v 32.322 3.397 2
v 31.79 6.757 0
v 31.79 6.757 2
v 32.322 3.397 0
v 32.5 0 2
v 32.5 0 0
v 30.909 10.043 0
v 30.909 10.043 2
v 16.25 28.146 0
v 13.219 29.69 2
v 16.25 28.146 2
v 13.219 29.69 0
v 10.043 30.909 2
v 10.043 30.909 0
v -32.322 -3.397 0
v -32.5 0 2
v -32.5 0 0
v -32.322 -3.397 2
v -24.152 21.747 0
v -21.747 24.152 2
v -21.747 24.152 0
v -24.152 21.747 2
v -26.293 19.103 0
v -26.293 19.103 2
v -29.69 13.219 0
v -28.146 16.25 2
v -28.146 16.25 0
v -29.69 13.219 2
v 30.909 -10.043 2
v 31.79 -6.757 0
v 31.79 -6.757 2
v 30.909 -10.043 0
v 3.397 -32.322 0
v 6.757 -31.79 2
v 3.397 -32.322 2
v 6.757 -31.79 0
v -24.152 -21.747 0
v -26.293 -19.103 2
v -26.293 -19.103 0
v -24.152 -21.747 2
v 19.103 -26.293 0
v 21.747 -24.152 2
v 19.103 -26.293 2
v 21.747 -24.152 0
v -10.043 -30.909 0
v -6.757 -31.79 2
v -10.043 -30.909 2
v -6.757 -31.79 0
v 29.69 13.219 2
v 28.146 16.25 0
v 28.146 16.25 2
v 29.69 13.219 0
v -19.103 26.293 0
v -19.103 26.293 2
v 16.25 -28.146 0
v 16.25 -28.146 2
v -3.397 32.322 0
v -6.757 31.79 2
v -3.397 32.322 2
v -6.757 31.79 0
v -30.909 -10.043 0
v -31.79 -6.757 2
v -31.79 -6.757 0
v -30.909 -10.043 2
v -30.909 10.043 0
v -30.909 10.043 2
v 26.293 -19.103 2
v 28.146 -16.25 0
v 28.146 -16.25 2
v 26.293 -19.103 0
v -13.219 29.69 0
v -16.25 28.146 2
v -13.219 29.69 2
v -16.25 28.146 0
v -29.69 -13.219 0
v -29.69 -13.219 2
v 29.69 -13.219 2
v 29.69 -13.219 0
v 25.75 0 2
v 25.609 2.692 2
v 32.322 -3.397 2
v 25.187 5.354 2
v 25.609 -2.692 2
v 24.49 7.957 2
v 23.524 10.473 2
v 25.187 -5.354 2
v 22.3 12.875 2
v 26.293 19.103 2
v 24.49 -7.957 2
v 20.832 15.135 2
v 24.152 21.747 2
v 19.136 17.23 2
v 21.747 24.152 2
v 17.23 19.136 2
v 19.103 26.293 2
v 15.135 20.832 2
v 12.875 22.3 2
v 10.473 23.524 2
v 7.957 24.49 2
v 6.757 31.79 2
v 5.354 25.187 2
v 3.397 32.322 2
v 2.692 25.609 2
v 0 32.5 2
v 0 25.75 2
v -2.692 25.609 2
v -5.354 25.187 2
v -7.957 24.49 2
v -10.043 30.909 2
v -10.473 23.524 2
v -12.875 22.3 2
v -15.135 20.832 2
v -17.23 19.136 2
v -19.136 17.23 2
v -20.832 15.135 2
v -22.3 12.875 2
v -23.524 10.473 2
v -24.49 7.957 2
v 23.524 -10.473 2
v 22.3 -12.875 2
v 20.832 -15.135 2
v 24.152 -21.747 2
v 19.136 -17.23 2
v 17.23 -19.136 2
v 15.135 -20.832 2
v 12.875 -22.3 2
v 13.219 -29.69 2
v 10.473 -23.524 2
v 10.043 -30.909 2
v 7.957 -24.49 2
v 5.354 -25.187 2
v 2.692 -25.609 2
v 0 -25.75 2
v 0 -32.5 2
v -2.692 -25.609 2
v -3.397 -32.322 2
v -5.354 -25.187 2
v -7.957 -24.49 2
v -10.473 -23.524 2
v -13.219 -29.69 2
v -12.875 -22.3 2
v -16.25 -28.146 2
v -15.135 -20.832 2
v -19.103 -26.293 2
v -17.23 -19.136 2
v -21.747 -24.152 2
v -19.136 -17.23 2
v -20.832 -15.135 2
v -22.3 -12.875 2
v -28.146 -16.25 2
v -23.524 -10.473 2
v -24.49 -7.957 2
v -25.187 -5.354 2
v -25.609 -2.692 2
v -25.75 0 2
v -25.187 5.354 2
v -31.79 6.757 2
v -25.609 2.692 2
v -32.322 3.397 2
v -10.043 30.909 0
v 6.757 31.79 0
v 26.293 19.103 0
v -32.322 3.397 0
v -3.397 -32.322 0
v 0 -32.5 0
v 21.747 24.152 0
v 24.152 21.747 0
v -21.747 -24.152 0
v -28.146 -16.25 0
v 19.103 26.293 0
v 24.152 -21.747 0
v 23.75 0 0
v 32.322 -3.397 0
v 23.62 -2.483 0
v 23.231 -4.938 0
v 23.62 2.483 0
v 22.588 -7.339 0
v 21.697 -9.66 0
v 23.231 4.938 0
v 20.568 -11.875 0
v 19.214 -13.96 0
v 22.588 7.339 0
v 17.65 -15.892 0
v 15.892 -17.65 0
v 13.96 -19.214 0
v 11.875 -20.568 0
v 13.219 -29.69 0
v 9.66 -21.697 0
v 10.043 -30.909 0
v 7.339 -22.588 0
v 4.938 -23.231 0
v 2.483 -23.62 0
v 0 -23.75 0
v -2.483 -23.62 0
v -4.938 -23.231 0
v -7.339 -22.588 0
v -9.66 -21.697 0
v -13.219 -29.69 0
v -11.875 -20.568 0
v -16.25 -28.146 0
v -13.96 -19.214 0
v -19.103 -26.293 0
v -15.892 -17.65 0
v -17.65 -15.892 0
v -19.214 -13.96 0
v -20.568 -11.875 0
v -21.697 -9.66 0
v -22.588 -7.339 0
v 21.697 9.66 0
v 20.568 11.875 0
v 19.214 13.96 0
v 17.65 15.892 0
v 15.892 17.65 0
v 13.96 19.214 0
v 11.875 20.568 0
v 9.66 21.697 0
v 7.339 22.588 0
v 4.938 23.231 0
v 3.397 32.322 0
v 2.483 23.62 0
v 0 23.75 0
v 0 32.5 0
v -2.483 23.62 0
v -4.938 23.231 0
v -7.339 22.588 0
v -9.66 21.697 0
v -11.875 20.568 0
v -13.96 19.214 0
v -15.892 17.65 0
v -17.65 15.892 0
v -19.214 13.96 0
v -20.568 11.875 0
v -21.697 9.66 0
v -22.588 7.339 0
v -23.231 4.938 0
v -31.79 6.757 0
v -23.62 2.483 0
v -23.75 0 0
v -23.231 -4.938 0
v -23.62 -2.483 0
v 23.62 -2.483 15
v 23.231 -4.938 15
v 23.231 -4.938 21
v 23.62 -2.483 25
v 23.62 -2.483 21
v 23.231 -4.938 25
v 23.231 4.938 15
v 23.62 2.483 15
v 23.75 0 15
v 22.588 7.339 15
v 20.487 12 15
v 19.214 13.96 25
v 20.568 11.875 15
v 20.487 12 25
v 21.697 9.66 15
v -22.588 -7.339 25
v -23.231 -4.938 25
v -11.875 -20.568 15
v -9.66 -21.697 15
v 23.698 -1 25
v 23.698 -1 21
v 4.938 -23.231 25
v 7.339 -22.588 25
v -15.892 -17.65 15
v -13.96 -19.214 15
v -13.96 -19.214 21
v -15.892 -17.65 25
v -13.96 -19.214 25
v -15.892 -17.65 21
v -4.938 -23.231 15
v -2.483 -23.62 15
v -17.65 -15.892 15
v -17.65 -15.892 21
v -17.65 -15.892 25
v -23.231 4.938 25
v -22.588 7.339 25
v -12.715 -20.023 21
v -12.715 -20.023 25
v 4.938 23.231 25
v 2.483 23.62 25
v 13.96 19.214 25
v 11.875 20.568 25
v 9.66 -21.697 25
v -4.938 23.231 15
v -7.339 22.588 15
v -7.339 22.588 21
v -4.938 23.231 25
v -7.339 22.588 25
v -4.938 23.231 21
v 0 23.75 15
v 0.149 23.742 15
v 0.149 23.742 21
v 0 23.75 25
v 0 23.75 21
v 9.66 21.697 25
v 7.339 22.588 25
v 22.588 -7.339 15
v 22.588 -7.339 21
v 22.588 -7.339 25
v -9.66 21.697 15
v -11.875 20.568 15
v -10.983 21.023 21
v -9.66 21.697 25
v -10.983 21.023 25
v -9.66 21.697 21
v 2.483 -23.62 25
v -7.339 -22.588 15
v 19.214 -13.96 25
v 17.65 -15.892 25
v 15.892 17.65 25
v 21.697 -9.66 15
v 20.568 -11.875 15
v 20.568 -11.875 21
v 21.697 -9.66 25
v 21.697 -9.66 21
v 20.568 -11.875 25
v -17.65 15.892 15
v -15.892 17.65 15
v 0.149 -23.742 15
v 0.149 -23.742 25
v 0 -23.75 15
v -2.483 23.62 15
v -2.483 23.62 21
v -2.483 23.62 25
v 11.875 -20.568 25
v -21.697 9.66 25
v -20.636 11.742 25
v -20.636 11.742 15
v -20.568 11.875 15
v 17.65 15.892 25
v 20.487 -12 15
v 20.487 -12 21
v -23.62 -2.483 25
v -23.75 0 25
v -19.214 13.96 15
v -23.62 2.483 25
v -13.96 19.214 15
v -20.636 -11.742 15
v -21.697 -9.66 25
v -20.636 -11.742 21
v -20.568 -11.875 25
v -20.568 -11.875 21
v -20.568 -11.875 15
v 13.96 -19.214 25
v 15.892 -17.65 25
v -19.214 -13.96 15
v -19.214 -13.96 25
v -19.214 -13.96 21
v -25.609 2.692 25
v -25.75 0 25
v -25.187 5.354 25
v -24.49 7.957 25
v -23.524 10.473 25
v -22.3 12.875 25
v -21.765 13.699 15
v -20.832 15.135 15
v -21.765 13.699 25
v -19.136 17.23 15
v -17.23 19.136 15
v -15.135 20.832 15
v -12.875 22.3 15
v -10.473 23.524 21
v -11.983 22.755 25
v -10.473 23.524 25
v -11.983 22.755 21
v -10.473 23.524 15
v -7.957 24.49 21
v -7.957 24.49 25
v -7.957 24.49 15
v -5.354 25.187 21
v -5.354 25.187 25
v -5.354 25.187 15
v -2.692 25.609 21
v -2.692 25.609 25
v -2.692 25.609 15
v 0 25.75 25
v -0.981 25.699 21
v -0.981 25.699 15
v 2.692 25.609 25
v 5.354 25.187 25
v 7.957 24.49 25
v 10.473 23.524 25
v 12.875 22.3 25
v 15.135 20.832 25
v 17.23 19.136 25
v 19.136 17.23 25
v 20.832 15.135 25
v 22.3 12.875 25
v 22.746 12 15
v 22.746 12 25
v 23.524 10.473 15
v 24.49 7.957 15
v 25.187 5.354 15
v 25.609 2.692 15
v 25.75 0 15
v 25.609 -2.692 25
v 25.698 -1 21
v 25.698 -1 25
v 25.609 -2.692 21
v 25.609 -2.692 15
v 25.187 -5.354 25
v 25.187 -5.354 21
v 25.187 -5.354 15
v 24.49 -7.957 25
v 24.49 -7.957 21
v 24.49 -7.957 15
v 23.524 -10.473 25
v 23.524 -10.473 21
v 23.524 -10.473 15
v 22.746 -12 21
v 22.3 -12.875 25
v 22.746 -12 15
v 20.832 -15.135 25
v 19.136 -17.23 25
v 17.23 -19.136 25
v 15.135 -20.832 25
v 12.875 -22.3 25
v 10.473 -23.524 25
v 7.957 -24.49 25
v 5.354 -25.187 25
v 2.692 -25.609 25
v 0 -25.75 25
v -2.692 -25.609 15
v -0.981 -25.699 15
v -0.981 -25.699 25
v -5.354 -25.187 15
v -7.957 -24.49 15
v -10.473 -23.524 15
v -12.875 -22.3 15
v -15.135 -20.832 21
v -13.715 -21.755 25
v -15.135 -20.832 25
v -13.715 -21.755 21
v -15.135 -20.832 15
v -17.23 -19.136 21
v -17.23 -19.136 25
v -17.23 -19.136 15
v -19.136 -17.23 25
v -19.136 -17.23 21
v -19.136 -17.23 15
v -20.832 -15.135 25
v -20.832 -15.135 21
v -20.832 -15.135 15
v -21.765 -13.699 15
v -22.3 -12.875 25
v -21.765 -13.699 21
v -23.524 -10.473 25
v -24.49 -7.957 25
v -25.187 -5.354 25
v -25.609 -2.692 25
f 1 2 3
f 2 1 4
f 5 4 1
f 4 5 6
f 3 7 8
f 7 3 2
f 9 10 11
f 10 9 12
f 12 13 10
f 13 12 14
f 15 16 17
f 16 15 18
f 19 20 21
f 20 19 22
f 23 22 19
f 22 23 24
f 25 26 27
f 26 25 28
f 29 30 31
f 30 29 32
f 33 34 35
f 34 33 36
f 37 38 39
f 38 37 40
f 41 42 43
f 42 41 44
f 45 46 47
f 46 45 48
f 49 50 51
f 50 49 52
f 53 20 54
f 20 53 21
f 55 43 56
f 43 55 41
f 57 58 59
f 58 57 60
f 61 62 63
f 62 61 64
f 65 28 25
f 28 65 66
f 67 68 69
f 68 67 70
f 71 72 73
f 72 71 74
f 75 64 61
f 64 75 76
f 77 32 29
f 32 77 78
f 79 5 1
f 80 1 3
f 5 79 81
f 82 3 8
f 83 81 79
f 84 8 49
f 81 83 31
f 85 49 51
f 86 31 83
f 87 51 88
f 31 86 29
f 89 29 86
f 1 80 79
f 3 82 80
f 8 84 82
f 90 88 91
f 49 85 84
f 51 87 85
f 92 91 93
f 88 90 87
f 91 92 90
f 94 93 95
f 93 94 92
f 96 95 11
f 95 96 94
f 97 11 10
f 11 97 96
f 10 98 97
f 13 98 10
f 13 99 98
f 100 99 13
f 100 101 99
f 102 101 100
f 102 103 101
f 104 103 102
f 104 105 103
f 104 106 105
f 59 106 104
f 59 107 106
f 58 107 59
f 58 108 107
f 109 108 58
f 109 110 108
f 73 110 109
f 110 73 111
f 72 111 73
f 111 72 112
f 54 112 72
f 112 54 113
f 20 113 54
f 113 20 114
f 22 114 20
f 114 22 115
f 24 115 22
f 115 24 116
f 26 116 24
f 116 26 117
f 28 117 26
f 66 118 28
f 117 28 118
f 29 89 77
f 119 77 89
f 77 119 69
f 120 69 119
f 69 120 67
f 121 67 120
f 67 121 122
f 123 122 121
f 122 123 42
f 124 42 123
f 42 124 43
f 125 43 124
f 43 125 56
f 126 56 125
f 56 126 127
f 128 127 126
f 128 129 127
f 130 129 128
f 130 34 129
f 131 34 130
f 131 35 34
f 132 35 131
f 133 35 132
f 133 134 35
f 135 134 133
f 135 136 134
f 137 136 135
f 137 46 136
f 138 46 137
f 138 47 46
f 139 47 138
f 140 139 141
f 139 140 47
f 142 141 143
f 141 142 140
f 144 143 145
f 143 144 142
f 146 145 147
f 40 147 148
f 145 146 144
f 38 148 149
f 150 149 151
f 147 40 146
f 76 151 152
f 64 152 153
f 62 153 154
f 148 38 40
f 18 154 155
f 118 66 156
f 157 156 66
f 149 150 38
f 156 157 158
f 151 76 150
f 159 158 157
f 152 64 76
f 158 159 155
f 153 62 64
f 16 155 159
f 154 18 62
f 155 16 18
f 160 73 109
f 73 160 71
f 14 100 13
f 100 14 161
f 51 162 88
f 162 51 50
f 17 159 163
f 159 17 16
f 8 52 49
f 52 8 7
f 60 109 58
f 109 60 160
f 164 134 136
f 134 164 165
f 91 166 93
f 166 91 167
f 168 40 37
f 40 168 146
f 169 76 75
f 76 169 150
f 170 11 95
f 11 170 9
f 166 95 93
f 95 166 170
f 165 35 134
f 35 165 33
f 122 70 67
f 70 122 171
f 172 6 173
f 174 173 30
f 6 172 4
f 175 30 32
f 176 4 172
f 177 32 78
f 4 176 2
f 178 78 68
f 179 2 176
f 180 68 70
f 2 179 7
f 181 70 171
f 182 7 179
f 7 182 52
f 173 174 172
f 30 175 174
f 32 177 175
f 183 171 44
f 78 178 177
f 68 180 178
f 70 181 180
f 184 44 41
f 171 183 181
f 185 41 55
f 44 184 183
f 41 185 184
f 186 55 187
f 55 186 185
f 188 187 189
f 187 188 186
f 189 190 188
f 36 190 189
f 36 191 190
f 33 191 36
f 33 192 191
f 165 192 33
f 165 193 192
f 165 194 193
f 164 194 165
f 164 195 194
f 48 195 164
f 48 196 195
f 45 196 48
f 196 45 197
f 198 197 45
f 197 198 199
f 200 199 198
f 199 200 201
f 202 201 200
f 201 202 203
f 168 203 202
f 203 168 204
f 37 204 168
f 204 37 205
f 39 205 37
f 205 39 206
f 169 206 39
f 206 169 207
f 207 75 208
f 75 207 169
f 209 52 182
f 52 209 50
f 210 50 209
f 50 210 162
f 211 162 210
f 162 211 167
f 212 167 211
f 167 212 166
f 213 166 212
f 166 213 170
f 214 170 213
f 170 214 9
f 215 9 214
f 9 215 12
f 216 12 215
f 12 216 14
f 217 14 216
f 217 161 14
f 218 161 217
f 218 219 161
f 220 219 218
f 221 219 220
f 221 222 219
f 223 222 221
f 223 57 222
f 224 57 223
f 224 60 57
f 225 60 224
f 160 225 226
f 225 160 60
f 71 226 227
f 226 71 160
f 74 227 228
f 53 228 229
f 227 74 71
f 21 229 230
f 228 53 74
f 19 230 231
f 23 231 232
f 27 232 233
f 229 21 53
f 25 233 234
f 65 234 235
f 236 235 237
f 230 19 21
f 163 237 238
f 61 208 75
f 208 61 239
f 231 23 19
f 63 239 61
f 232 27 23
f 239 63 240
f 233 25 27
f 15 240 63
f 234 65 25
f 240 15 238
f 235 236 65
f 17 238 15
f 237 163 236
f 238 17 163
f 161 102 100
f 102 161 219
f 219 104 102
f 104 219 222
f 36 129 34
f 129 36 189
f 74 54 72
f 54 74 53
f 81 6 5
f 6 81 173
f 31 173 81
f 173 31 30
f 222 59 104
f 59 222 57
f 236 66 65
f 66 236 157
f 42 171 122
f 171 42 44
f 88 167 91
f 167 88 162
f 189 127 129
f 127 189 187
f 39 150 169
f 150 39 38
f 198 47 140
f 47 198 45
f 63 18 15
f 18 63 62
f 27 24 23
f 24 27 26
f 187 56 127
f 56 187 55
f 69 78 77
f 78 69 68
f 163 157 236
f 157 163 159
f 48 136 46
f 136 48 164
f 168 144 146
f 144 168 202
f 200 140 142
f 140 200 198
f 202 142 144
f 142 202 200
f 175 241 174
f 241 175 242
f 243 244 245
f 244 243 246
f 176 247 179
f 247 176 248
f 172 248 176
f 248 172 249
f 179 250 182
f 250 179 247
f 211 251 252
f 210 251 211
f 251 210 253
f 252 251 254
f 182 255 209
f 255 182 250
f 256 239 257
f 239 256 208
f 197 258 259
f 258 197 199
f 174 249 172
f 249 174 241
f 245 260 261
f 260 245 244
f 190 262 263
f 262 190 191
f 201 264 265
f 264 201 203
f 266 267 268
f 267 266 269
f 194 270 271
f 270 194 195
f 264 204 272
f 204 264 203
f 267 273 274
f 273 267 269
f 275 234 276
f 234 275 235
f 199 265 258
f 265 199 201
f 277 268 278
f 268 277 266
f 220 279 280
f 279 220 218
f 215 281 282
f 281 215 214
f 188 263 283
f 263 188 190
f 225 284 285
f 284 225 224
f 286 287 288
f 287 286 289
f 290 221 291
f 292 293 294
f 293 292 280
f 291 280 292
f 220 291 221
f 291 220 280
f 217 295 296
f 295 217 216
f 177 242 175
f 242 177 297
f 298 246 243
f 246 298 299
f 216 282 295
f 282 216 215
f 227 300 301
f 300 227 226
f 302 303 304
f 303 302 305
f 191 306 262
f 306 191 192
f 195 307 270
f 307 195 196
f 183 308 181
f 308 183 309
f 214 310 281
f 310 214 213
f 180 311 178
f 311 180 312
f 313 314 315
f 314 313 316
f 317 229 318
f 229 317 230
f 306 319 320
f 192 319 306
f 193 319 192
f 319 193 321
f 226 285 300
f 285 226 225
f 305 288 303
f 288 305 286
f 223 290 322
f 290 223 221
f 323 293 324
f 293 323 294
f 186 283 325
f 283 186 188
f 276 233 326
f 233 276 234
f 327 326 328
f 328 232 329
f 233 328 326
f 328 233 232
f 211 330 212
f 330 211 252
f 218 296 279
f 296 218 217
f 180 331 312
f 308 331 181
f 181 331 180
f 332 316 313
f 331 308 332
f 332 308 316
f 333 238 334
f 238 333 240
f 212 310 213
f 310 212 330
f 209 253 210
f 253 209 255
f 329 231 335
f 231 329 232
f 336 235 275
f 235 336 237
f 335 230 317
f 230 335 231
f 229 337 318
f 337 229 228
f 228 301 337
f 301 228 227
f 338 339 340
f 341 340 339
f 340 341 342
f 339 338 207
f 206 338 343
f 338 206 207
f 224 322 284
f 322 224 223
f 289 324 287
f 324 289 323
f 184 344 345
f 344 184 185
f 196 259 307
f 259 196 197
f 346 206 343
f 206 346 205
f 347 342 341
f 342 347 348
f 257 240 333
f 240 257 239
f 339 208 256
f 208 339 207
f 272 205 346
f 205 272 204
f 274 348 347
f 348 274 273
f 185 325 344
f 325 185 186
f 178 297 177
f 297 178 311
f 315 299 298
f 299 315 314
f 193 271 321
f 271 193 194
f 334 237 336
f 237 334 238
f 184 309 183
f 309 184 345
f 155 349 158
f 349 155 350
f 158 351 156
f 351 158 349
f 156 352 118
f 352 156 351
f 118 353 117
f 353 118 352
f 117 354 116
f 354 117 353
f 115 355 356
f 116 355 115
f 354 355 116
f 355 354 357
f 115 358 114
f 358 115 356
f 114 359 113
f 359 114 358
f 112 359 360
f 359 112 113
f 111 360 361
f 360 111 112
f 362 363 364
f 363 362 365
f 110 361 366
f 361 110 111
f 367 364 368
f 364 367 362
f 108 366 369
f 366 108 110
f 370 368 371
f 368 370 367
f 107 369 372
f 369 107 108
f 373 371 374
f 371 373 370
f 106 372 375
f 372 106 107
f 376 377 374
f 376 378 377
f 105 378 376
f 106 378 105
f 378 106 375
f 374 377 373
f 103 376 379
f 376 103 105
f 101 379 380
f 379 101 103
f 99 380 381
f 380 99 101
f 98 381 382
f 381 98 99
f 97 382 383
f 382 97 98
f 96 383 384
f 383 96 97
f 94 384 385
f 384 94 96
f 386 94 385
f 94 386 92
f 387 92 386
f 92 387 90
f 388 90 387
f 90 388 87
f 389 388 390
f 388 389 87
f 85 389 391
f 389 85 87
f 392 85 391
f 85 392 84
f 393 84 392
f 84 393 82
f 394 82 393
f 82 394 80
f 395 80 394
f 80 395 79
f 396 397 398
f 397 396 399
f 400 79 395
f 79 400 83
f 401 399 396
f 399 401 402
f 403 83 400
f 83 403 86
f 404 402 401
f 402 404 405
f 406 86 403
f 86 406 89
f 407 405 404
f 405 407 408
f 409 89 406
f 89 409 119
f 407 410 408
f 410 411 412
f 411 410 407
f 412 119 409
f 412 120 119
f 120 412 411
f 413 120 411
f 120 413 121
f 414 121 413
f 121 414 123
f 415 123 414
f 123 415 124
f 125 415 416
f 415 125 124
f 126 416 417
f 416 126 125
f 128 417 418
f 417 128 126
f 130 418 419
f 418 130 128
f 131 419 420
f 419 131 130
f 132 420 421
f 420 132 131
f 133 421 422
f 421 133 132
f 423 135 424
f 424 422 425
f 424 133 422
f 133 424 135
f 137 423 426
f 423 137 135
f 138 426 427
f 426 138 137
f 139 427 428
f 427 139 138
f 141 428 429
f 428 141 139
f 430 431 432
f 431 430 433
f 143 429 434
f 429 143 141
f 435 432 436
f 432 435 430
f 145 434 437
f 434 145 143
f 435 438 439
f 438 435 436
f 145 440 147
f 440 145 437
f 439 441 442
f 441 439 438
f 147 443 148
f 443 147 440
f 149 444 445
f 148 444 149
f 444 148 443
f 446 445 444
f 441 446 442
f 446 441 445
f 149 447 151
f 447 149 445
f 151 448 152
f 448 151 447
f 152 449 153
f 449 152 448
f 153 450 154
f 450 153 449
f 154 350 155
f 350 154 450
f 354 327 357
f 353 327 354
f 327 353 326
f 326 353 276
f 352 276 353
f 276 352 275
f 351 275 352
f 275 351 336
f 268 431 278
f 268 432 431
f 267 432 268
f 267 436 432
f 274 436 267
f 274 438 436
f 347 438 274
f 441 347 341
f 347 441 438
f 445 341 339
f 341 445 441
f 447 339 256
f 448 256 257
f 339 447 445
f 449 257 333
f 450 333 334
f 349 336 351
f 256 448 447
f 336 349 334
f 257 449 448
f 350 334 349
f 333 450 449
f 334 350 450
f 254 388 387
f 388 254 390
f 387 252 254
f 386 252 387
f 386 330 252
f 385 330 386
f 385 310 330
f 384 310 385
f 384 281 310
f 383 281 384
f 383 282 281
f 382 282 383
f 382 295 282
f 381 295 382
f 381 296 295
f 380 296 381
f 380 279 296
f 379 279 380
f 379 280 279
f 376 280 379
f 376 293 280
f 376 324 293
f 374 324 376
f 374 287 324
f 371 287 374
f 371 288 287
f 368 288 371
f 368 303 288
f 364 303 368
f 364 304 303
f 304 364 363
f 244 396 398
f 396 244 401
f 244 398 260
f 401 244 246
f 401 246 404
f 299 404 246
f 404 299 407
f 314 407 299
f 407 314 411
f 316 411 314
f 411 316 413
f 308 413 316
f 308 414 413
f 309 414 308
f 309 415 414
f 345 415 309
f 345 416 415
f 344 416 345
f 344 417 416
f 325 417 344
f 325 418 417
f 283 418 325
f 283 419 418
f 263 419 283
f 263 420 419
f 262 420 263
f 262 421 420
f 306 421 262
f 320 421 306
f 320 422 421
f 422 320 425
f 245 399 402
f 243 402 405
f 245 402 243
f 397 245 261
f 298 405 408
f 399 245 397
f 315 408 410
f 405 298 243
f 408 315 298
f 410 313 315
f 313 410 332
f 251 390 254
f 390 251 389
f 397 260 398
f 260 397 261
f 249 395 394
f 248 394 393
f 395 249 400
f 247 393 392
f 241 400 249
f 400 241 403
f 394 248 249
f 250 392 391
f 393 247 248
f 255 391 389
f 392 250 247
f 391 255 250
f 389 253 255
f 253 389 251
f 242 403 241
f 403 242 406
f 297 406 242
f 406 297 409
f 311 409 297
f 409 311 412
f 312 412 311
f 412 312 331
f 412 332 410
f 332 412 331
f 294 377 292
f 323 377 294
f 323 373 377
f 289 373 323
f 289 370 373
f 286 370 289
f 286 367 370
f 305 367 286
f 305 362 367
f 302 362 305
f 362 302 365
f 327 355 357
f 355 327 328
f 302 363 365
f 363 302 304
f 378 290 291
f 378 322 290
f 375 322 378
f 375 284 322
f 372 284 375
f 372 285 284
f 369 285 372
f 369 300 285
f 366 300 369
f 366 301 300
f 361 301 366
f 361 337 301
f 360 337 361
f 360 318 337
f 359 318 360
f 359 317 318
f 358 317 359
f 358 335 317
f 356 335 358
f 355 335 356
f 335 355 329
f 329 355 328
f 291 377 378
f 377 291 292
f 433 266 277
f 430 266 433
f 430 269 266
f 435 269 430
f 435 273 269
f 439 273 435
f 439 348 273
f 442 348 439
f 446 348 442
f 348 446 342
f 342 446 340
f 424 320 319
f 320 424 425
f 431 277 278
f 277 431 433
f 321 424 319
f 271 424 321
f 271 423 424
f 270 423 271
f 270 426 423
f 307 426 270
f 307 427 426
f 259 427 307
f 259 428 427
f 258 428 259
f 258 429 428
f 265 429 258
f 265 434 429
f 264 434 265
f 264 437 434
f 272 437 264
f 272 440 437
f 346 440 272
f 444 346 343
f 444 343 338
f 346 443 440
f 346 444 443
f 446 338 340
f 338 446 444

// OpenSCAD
$fn = 60;
bushshell = 2;
bushheight = 25;
bushdiam = 47.5 ;
ringdiam = 65;
holediam = 47.5;
ringthk = 2 ;
primwd = 13 ;
primht = 4 ;
secwd = 24 ;
secht = 6;
module mainpart(bushdiam,bushshell,bushheight,ringthk,ringdiam,holediam) {
rotate_extrude(convexity = 10) translate([bushdiam/2,0,0]) square([bushshell,bushheight],0) ;  
difference () {
    cylinder(ringthk,ringdiam/2,ringdiam/2);
    translate([0,0,-.5]) 
    cylinder(ringthk+1,holediam/2,holediam/2);} 
}
module knockout(primwd,bushheight,primht,secwd,secht) {
    translate([0,-primwd/2,bushheight-primht]) 
        cube (size = [bushdiam/2+primwd,primwd,primht],center = false);
    translate([0,-secwd+primwd/2,bushheight-primht-secht]) 
        cube (size = [bushdiam/2+secwd/2,secwd,secht], center = false);  }
difference() {
mainpart(bushdiam,bushshell,bushheight,ringthk,ringdiam,holediam);        
translate([0,secwd/2-primwd/2,0])
        knockout(primwd,bushheight,primht,secwd,secht);
rotate([0,0,120]) translate([0,secwd/2-primwd/2,0])
        knockout(primwd,bushheight,primht,secwd,secht);
rotate([0,0,-120]) translate([0,secwd/2-primwd/2,0])
        knockout(primwd,bushheight,primht,secwd,secht); }
        
